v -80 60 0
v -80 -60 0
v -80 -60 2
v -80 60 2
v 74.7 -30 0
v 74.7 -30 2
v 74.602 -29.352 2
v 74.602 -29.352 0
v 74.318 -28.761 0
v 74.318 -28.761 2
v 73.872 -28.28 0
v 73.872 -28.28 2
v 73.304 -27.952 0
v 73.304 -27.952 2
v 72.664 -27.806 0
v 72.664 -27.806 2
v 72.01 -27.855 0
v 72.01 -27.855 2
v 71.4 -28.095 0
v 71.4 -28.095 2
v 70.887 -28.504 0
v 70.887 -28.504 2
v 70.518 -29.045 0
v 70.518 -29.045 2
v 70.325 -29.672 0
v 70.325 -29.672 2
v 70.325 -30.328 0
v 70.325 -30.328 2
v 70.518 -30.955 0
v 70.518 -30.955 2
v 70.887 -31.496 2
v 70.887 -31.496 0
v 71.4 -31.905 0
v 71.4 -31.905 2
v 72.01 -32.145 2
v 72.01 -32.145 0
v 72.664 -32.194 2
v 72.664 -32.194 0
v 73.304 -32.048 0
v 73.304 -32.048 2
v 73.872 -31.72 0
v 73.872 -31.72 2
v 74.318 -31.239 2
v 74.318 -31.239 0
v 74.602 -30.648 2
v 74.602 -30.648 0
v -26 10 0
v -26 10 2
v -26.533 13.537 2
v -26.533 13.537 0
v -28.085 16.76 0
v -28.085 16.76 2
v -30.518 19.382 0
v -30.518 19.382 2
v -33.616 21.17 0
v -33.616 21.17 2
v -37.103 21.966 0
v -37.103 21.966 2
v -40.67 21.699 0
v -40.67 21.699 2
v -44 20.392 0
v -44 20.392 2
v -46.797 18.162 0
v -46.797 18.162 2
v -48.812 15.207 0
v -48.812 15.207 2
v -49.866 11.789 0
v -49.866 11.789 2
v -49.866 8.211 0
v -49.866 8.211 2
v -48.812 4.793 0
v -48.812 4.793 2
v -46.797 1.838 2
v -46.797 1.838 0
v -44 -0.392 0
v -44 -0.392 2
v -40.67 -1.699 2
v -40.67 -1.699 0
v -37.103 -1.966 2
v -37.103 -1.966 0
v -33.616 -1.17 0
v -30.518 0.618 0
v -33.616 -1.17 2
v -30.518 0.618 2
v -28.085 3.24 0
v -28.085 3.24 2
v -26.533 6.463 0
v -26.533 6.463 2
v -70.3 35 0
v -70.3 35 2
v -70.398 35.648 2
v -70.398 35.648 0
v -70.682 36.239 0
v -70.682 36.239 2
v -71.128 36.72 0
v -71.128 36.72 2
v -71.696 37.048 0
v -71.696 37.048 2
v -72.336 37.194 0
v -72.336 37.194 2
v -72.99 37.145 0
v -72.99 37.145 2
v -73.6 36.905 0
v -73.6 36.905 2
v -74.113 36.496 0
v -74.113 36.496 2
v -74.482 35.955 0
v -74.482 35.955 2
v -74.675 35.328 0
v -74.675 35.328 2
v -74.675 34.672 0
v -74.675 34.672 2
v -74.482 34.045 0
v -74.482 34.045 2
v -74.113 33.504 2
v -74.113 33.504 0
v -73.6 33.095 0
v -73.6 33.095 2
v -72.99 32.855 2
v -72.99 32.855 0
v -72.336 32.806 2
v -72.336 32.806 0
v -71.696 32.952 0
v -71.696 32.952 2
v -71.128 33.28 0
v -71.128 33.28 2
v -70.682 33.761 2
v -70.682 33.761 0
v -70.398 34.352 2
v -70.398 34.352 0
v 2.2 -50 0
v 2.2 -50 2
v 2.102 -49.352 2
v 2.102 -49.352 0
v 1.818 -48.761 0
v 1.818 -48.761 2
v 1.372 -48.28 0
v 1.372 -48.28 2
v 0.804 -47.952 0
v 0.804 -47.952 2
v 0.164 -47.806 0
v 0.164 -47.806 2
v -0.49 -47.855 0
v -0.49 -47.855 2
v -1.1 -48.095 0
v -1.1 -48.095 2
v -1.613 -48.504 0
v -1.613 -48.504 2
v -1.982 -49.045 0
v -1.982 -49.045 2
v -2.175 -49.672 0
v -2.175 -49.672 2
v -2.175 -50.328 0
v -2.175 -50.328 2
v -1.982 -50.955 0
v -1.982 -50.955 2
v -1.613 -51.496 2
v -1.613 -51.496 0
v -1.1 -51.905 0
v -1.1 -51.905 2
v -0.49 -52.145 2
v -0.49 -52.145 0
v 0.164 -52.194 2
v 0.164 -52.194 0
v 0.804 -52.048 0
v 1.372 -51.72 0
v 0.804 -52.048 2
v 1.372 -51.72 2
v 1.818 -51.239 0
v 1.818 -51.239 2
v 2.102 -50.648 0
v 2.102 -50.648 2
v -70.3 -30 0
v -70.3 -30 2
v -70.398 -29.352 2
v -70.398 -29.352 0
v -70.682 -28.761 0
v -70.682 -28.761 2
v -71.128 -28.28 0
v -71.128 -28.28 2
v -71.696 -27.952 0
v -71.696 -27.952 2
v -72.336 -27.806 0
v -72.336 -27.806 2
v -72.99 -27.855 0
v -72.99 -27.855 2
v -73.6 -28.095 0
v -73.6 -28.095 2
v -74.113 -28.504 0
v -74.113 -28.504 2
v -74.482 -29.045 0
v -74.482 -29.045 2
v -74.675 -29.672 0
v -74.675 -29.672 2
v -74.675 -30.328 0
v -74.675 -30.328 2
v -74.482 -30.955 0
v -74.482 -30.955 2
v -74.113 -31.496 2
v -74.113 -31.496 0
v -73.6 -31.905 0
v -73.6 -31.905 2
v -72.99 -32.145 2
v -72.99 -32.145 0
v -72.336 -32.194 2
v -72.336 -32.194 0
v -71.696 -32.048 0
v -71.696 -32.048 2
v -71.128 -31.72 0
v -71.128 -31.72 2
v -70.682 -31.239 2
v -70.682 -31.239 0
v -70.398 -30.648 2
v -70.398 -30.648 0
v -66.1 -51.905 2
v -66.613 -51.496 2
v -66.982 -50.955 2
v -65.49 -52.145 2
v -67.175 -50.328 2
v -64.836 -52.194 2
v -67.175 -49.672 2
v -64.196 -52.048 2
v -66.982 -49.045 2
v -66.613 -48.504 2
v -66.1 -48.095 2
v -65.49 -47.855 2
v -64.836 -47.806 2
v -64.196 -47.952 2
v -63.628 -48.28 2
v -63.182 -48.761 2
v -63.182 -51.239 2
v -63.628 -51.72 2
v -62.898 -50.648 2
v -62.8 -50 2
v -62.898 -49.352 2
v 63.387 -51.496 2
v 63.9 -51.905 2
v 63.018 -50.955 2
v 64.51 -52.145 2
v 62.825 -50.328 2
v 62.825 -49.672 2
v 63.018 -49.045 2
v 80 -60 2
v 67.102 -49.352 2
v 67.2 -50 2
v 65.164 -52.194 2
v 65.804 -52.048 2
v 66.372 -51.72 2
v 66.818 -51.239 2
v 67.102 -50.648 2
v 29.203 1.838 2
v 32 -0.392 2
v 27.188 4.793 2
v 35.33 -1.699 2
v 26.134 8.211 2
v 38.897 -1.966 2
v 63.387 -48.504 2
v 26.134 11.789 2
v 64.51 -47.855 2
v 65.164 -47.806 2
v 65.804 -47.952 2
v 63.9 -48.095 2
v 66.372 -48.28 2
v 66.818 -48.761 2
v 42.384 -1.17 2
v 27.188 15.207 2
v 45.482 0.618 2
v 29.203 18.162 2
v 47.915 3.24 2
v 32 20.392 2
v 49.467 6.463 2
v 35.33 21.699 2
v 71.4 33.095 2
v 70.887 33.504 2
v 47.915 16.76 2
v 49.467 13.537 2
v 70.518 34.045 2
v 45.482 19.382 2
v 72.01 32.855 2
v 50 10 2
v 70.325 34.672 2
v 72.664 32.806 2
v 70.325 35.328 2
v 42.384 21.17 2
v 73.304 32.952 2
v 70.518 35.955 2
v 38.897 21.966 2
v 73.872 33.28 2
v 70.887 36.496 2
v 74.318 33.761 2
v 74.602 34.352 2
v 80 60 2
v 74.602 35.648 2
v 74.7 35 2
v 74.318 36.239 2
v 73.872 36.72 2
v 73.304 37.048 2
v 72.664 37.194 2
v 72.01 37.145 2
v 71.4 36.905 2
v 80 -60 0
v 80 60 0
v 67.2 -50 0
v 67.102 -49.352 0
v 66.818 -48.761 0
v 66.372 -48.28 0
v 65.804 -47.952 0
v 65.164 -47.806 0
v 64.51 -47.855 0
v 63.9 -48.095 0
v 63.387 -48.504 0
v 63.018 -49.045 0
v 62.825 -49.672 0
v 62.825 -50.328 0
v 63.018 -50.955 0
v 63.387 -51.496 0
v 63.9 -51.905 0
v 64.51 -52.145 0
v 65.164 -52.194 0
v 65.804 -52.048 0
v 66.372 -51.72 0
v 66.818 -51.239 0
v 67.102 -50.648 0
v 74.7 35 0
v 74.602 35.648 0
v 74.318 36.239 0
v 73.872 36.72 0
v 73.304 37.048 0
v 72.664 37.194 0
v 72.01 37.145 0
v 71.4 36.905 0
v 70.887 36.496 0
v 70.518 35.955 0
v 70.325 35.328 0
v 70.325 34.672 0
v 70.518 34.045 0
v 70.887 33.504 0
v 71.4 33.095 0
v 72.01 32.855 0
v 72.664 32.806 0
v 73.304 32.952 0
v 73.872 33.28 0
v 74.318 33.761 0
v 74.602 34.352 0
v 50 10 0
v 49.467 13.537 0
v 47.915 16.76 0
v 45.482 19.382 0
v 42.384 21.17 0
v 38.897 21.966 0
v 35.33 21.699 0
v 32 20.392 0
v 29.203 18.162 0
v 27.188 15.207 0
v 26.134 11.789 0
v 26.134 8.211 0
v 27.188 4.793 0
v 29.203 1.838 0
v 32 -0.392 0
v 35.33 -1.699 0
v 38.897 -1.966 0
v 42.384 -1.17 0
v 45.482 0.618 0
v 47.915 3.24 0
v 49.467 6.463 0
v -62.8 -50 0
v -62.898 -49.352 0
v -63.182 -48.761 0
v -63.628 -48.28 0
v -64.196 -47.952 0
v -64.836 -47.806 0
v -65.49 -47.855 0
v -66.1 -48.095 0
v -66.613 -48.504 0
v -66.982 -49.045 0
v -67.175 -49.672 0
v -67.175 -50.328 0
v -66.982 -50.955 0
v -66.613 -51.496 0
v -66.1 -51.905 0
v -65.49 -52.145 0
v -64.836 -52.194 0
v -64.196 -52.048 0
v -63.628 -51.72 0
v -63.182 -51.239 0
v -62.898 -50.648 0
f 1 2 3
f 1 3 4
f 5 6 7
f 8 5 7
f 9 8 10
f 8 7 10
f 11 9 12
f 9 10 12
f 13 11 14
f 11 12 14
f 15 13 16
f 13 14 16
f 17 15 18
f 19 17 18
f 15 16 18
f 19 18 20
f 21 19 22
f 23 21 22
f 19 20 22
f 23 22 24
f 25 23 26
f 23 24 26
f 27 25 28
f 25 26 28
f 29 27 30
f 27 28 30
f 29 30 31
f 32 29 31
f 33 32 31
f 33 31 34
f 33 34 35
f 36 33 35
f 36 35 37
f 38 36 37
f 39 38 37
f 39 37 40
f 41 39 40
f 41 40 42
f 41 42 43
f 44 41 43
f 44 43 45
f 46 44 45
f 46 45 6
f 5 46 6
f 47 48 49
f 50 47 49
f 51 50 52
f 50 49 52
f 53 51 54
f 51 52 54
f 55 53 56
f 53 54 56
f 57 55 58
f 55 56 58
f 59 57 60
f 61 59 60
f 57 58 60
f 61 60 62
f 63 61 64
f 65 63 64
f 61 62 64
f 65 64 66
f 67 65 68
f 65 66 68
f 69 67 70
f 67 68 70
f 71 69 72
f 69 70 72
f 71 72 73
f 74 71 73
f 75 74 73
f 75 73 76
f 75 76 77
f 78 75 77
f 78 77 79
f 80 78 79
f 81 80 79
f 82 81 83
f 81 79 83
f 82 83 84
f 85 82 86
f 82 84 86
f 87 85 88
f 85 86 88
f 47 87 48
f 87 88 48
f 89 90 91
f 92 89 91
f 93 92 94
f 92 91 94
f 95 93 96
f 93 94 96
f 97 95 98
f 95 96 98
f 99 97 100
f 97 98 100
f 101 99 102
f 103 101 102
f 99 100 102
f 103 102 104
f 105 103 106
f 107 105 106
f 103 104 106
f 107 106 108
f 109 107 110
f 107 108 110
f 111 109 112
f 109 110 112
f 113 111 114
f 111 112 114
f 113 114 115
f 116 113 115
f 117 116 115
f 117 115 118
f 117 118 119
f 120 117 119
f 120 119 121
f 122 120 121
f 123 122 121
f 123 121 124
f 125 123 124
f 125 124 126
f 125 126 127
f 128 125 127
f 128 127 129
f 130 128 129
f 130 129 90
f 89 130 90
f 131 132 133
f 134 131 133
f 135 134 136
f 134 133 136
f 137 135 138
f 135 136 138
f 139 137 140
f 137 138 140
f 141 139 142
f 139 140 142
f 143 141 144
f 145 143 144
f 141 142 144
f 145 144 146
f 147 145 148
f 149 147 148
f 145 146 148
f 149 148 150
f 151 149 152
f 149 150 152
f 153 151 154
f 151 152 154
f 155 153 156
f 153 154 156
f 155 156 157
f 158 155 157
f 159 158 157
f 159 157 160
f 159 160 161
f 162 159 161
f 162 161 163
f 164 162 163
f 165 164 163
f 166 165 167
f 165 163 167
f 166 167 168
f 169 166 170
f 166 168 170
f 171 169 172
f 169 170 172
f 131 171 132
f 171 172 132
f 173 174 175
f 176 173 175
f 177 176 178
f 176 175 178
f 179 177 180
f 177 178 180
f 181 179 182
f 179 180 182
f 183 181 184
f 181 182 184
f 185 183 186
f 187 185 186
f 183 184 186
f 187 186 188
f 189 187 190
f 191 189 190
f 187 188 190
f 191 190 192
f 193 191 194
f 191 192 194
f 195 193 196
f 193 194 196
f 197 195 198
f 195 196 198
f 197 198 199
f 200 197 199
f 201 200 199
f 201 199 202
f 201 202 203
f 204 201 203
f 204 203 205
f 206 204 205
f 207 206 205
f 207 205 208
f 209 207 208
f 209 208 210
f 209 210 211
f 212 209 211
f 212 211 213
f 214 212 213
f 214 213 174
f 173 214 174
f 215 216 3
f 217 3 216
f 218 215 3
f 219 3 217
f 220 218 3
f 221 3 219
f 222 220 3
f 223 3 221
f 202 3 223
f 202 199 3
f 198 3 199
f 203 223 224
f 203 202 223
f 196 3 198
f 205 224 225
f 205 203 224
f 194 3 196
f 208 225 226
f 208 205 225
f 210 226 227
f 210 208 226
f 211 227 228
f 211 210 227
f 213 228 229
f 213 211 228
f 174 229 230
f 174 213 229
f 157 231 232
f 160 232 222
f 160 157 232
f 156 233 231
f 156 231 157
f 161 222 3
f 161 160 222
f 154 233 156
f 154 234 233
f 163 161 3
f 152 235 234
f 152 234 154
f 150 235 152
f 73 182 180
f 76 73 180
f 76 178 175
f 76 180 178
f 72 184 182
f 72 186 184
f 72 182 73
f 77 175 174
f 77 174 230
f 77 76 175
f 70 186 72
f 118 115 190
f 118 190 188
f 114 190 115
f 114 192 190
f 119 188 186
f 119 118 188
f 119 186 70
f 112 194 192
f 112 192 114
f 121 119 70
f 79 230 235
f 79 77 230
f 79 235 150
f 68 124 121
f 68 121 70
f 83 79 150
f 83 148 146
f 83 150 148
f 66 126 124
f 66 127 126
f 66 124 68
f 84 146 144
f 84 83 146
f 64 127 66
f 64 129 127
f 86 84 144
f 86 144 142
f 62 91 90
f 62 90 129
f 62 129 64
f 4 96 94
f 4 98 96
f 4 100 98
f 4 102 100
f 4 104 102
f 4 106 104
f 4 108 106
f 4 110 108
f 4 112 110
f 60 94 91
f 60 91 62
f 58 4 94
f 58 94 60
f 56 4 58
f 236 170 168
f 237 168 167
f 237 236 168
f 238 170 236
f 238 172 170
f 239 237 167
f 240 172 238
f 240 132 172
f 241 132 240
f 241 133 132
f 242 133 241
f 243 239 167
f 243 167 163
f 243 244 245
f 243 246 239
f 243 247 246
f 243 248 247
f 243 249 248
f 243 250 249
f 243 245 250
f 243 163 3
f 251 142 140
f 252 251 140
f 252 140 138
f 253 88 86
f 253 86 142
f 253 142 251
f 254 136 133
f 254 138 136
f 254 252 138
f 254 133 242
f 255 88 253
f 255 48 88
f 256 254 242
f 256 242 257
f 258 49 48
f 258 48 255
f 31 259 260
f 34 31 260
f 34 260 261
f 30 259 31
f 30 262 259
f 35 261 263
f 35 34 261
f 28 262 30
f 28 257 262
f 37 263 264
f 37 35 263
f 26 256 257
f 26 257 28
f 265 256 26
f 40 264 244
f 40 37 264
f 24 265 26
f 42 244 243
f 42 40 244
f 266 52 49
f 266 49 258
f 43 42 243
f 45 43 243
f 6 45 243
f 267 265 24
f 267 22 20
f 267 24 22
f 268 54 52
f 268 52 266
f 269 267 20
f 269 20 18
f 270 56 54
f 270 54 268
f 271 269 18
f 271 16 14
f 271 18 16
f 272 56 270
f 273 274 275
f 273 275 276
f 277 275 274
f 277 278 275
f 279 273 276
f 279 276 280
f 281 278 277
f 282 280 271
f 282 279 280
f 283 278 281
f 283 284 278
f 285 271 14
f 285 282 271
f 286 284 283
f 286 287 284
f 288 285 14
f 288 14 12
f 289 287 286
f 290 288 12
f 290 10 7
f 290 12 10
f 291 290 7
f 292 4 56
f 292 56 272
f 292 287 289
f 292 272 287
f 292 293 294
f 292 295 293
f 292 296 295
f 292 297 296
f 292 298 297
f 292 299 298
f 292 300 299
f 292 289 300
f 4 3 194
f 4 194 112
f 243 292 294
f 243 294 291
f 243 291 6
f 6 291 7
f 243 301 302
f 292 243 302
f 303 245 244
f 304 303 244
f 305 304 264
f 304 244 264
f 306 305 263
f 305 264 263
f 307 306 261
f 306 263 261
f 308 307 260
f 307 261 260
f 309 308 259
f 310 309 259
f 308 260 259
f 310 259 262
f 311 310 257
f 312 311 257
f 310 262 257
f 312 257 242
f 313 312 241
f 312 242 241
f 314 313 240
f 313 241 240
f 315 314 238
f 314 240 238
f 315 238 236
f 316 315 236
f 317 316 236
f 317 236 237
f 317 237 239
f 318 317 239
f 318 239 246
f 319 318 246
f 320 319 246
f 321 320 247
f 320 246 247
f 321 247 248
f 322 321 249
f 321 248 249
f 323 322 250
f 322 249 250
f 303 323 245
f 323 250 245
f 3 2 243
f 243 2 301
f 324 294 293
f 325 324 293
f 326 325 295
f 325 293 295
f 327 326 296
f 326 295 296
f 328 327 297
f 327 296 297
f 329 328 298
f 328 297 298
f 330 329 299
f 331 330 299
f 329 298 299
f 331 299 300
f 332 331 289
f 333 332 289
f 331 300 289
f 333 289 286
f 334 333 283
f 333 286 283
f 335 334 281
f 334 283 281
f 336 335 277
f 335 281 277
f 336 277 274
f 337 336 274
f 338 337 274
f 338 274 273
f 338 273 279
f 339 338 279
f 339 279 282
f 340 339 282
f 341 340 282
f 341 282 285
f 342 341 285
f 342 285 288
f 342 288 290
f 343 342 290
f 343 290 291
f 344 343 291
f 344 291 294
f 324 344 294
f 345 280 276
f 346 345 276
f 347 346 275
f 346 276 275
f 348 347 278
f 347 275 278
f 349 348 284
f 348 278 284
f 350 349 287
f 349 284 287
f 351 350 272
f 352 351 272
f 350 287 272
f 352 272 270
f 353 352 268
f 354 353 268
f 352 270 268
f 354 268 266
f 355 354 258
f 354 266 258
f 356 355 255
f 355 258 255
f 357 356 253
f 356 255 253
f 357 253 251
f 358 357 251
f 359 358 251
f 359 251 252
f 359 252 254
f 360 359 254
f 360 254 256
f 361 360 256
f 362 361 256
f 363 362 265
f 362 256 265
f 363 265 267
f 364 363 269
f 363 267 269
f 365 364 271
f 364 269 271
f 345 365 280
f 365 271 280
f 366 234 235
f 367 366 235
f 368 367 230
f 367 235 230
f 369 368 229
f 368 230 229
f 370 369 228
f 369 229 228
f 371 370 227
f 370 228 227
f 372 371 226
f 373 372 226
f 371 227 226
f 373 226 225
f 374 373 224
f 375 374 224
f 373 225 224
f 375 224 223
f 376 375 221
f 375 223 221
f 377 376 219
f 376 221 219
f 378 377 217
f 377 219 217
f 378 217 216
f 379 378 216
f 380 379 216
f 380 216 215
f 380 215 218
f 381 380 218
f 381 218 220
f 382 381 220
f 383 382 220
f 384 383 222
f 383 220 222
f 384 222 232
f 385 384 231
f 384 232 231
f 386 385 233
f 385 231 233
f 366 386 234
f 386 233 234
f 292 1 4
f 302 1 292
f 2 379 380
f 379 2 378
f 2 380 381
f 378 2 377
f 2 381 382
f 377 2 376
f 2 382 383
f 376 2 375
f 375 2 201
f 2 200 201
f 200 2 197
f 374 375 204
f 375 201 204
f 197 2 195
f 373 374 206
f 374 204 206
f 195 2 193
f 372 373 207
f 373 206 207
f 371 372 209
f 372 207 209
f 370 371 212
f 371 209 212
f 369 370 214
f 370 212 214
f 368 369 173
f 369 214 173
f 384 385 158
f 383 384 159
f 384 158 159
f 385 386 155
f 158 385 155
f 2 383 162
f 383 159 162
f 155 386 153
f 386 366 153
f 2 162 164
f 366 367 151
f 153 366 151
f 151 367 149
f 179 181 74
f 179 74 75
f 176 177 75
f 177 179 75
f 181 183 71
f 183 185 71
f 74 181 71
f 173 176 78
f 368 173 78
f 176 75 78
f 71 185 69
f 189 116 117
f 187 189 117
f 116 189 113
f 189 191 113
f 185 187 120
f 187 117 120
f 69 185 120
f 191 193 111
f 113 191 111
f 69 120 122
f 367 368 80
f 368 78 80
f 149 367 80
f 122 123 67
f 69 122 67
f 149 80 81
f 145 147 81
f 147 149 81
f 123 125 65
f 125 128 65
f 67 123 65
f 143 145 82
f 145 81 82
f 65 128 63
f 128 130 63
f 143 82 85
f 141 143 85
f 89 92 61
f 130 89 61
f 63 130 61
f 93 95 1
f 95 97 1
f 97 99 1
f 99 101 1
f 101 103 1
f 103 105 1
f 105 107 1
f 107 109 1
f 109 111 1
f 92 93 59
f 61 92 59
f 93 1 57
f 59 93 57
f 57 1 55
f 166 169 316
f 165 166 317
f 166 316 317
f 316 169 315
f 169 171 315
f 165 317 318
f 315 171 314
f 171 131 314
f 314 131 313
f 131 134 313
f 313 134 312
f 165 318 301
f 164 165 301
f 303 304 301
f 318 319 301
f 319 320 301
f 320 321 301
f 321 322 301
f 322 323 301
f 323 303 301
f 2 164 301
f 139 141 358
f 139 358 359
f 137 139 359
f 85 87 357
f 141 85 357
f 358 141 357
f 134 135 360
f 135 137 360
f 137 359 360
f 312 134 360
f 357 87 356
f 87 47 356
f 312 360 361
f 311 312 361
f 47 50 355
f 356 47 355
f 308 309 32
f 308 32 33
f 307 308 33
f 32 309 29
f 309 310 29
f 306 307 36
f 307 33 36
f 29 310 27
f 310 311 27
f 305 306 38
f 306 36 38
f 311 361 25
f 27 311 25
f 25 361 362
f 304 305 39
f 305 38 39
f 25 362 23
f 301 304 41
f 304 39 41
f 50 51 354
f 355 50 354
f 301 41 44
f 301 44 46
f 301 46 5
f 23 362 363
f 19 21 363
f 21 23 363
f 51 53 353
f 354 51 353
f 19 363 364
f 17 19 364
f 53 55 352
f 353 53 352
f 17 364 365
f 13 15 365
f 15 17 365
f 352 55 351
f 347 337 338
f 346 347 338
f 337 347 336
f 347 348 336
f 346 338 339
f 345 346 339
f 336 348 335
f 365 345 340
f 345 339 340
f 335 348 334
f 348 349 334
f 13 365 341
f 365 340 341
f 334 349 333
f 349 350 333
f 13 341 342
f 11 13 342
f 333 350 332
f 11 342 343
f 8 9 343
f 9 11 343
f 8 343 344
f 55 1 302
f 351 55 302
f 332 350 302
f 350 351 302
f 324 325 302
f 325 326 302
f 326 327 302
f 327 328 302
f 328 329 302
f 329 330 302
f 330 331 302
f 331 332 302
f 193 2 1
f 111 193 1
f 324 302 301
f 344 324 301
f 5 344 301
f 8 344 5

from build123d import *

# Parameters (mm, degrees)
SKETCH_1_W          = 160
SKETCH_1_H          = 120
EXTRUDE_1_DEPTH     = 2
SKETCH_2_R          = 2.2
SKETCH_2_R_2        = 12
CUT_EXTRUDE_1_DEPTH = 2
SKETCH_4_R          = 2.2
CUT_EXTRUDE_2_DEPTH = 105


with BuildPart() as part:
    # ｽｹｯﾁ1 → ﾎﾞｽ - 押し出し1 (new body)
    with BuildSketch(Plane.XY):
        Rectangle(SKETCH_1_W, SKETCH_1_H)
    extrude(amount=EXTRUDE_1_DEPTH)

    # ｽｹｯﾁ2 → ｶｯﾄ - 押し出し1 (cut)
    with BuildSketch(Plane.XY.offset(2)):
        with Locations((0, -50)):
            Circle(SKETCH_2_R)
        with Locations((-65, -50)):
            Circle(SKETCH_2_R)
        with Locations((-38, 10)):
            Circle(SKETCH_2_R_2)
        with Locations((38, 10)):
            Circle(SKETCH_2_R_2)
        with Locations((65, -50)):
            Circle(SKETCH_2_R)
    extrude(amount=-CUT_EXTRUDE_1_DEPTH, mode=Mode.SUBTRACT)

    # ｽｹｯﾁ4 → ｶｯﾄ - 押し出し2 (cut)
    with BuildSketch(Plane.XY.offset(2)):
        with Locations((72.5, 35)):
            Circle(SKETCH_4_R)
        with Locations((72.5, -30)):
            Circle(SKETCH_4_R)
        with Locations((-72.5, 35)):
            Circle(SKETCH_4_R)
        with Locations((-72.5, -30)):
            Circle(SKETCH_4_R)
    extrude(amount=-CUT_EXTRUDE_2_DEPTH, mode=Mode.SUBTRACT)


solid = part.part
